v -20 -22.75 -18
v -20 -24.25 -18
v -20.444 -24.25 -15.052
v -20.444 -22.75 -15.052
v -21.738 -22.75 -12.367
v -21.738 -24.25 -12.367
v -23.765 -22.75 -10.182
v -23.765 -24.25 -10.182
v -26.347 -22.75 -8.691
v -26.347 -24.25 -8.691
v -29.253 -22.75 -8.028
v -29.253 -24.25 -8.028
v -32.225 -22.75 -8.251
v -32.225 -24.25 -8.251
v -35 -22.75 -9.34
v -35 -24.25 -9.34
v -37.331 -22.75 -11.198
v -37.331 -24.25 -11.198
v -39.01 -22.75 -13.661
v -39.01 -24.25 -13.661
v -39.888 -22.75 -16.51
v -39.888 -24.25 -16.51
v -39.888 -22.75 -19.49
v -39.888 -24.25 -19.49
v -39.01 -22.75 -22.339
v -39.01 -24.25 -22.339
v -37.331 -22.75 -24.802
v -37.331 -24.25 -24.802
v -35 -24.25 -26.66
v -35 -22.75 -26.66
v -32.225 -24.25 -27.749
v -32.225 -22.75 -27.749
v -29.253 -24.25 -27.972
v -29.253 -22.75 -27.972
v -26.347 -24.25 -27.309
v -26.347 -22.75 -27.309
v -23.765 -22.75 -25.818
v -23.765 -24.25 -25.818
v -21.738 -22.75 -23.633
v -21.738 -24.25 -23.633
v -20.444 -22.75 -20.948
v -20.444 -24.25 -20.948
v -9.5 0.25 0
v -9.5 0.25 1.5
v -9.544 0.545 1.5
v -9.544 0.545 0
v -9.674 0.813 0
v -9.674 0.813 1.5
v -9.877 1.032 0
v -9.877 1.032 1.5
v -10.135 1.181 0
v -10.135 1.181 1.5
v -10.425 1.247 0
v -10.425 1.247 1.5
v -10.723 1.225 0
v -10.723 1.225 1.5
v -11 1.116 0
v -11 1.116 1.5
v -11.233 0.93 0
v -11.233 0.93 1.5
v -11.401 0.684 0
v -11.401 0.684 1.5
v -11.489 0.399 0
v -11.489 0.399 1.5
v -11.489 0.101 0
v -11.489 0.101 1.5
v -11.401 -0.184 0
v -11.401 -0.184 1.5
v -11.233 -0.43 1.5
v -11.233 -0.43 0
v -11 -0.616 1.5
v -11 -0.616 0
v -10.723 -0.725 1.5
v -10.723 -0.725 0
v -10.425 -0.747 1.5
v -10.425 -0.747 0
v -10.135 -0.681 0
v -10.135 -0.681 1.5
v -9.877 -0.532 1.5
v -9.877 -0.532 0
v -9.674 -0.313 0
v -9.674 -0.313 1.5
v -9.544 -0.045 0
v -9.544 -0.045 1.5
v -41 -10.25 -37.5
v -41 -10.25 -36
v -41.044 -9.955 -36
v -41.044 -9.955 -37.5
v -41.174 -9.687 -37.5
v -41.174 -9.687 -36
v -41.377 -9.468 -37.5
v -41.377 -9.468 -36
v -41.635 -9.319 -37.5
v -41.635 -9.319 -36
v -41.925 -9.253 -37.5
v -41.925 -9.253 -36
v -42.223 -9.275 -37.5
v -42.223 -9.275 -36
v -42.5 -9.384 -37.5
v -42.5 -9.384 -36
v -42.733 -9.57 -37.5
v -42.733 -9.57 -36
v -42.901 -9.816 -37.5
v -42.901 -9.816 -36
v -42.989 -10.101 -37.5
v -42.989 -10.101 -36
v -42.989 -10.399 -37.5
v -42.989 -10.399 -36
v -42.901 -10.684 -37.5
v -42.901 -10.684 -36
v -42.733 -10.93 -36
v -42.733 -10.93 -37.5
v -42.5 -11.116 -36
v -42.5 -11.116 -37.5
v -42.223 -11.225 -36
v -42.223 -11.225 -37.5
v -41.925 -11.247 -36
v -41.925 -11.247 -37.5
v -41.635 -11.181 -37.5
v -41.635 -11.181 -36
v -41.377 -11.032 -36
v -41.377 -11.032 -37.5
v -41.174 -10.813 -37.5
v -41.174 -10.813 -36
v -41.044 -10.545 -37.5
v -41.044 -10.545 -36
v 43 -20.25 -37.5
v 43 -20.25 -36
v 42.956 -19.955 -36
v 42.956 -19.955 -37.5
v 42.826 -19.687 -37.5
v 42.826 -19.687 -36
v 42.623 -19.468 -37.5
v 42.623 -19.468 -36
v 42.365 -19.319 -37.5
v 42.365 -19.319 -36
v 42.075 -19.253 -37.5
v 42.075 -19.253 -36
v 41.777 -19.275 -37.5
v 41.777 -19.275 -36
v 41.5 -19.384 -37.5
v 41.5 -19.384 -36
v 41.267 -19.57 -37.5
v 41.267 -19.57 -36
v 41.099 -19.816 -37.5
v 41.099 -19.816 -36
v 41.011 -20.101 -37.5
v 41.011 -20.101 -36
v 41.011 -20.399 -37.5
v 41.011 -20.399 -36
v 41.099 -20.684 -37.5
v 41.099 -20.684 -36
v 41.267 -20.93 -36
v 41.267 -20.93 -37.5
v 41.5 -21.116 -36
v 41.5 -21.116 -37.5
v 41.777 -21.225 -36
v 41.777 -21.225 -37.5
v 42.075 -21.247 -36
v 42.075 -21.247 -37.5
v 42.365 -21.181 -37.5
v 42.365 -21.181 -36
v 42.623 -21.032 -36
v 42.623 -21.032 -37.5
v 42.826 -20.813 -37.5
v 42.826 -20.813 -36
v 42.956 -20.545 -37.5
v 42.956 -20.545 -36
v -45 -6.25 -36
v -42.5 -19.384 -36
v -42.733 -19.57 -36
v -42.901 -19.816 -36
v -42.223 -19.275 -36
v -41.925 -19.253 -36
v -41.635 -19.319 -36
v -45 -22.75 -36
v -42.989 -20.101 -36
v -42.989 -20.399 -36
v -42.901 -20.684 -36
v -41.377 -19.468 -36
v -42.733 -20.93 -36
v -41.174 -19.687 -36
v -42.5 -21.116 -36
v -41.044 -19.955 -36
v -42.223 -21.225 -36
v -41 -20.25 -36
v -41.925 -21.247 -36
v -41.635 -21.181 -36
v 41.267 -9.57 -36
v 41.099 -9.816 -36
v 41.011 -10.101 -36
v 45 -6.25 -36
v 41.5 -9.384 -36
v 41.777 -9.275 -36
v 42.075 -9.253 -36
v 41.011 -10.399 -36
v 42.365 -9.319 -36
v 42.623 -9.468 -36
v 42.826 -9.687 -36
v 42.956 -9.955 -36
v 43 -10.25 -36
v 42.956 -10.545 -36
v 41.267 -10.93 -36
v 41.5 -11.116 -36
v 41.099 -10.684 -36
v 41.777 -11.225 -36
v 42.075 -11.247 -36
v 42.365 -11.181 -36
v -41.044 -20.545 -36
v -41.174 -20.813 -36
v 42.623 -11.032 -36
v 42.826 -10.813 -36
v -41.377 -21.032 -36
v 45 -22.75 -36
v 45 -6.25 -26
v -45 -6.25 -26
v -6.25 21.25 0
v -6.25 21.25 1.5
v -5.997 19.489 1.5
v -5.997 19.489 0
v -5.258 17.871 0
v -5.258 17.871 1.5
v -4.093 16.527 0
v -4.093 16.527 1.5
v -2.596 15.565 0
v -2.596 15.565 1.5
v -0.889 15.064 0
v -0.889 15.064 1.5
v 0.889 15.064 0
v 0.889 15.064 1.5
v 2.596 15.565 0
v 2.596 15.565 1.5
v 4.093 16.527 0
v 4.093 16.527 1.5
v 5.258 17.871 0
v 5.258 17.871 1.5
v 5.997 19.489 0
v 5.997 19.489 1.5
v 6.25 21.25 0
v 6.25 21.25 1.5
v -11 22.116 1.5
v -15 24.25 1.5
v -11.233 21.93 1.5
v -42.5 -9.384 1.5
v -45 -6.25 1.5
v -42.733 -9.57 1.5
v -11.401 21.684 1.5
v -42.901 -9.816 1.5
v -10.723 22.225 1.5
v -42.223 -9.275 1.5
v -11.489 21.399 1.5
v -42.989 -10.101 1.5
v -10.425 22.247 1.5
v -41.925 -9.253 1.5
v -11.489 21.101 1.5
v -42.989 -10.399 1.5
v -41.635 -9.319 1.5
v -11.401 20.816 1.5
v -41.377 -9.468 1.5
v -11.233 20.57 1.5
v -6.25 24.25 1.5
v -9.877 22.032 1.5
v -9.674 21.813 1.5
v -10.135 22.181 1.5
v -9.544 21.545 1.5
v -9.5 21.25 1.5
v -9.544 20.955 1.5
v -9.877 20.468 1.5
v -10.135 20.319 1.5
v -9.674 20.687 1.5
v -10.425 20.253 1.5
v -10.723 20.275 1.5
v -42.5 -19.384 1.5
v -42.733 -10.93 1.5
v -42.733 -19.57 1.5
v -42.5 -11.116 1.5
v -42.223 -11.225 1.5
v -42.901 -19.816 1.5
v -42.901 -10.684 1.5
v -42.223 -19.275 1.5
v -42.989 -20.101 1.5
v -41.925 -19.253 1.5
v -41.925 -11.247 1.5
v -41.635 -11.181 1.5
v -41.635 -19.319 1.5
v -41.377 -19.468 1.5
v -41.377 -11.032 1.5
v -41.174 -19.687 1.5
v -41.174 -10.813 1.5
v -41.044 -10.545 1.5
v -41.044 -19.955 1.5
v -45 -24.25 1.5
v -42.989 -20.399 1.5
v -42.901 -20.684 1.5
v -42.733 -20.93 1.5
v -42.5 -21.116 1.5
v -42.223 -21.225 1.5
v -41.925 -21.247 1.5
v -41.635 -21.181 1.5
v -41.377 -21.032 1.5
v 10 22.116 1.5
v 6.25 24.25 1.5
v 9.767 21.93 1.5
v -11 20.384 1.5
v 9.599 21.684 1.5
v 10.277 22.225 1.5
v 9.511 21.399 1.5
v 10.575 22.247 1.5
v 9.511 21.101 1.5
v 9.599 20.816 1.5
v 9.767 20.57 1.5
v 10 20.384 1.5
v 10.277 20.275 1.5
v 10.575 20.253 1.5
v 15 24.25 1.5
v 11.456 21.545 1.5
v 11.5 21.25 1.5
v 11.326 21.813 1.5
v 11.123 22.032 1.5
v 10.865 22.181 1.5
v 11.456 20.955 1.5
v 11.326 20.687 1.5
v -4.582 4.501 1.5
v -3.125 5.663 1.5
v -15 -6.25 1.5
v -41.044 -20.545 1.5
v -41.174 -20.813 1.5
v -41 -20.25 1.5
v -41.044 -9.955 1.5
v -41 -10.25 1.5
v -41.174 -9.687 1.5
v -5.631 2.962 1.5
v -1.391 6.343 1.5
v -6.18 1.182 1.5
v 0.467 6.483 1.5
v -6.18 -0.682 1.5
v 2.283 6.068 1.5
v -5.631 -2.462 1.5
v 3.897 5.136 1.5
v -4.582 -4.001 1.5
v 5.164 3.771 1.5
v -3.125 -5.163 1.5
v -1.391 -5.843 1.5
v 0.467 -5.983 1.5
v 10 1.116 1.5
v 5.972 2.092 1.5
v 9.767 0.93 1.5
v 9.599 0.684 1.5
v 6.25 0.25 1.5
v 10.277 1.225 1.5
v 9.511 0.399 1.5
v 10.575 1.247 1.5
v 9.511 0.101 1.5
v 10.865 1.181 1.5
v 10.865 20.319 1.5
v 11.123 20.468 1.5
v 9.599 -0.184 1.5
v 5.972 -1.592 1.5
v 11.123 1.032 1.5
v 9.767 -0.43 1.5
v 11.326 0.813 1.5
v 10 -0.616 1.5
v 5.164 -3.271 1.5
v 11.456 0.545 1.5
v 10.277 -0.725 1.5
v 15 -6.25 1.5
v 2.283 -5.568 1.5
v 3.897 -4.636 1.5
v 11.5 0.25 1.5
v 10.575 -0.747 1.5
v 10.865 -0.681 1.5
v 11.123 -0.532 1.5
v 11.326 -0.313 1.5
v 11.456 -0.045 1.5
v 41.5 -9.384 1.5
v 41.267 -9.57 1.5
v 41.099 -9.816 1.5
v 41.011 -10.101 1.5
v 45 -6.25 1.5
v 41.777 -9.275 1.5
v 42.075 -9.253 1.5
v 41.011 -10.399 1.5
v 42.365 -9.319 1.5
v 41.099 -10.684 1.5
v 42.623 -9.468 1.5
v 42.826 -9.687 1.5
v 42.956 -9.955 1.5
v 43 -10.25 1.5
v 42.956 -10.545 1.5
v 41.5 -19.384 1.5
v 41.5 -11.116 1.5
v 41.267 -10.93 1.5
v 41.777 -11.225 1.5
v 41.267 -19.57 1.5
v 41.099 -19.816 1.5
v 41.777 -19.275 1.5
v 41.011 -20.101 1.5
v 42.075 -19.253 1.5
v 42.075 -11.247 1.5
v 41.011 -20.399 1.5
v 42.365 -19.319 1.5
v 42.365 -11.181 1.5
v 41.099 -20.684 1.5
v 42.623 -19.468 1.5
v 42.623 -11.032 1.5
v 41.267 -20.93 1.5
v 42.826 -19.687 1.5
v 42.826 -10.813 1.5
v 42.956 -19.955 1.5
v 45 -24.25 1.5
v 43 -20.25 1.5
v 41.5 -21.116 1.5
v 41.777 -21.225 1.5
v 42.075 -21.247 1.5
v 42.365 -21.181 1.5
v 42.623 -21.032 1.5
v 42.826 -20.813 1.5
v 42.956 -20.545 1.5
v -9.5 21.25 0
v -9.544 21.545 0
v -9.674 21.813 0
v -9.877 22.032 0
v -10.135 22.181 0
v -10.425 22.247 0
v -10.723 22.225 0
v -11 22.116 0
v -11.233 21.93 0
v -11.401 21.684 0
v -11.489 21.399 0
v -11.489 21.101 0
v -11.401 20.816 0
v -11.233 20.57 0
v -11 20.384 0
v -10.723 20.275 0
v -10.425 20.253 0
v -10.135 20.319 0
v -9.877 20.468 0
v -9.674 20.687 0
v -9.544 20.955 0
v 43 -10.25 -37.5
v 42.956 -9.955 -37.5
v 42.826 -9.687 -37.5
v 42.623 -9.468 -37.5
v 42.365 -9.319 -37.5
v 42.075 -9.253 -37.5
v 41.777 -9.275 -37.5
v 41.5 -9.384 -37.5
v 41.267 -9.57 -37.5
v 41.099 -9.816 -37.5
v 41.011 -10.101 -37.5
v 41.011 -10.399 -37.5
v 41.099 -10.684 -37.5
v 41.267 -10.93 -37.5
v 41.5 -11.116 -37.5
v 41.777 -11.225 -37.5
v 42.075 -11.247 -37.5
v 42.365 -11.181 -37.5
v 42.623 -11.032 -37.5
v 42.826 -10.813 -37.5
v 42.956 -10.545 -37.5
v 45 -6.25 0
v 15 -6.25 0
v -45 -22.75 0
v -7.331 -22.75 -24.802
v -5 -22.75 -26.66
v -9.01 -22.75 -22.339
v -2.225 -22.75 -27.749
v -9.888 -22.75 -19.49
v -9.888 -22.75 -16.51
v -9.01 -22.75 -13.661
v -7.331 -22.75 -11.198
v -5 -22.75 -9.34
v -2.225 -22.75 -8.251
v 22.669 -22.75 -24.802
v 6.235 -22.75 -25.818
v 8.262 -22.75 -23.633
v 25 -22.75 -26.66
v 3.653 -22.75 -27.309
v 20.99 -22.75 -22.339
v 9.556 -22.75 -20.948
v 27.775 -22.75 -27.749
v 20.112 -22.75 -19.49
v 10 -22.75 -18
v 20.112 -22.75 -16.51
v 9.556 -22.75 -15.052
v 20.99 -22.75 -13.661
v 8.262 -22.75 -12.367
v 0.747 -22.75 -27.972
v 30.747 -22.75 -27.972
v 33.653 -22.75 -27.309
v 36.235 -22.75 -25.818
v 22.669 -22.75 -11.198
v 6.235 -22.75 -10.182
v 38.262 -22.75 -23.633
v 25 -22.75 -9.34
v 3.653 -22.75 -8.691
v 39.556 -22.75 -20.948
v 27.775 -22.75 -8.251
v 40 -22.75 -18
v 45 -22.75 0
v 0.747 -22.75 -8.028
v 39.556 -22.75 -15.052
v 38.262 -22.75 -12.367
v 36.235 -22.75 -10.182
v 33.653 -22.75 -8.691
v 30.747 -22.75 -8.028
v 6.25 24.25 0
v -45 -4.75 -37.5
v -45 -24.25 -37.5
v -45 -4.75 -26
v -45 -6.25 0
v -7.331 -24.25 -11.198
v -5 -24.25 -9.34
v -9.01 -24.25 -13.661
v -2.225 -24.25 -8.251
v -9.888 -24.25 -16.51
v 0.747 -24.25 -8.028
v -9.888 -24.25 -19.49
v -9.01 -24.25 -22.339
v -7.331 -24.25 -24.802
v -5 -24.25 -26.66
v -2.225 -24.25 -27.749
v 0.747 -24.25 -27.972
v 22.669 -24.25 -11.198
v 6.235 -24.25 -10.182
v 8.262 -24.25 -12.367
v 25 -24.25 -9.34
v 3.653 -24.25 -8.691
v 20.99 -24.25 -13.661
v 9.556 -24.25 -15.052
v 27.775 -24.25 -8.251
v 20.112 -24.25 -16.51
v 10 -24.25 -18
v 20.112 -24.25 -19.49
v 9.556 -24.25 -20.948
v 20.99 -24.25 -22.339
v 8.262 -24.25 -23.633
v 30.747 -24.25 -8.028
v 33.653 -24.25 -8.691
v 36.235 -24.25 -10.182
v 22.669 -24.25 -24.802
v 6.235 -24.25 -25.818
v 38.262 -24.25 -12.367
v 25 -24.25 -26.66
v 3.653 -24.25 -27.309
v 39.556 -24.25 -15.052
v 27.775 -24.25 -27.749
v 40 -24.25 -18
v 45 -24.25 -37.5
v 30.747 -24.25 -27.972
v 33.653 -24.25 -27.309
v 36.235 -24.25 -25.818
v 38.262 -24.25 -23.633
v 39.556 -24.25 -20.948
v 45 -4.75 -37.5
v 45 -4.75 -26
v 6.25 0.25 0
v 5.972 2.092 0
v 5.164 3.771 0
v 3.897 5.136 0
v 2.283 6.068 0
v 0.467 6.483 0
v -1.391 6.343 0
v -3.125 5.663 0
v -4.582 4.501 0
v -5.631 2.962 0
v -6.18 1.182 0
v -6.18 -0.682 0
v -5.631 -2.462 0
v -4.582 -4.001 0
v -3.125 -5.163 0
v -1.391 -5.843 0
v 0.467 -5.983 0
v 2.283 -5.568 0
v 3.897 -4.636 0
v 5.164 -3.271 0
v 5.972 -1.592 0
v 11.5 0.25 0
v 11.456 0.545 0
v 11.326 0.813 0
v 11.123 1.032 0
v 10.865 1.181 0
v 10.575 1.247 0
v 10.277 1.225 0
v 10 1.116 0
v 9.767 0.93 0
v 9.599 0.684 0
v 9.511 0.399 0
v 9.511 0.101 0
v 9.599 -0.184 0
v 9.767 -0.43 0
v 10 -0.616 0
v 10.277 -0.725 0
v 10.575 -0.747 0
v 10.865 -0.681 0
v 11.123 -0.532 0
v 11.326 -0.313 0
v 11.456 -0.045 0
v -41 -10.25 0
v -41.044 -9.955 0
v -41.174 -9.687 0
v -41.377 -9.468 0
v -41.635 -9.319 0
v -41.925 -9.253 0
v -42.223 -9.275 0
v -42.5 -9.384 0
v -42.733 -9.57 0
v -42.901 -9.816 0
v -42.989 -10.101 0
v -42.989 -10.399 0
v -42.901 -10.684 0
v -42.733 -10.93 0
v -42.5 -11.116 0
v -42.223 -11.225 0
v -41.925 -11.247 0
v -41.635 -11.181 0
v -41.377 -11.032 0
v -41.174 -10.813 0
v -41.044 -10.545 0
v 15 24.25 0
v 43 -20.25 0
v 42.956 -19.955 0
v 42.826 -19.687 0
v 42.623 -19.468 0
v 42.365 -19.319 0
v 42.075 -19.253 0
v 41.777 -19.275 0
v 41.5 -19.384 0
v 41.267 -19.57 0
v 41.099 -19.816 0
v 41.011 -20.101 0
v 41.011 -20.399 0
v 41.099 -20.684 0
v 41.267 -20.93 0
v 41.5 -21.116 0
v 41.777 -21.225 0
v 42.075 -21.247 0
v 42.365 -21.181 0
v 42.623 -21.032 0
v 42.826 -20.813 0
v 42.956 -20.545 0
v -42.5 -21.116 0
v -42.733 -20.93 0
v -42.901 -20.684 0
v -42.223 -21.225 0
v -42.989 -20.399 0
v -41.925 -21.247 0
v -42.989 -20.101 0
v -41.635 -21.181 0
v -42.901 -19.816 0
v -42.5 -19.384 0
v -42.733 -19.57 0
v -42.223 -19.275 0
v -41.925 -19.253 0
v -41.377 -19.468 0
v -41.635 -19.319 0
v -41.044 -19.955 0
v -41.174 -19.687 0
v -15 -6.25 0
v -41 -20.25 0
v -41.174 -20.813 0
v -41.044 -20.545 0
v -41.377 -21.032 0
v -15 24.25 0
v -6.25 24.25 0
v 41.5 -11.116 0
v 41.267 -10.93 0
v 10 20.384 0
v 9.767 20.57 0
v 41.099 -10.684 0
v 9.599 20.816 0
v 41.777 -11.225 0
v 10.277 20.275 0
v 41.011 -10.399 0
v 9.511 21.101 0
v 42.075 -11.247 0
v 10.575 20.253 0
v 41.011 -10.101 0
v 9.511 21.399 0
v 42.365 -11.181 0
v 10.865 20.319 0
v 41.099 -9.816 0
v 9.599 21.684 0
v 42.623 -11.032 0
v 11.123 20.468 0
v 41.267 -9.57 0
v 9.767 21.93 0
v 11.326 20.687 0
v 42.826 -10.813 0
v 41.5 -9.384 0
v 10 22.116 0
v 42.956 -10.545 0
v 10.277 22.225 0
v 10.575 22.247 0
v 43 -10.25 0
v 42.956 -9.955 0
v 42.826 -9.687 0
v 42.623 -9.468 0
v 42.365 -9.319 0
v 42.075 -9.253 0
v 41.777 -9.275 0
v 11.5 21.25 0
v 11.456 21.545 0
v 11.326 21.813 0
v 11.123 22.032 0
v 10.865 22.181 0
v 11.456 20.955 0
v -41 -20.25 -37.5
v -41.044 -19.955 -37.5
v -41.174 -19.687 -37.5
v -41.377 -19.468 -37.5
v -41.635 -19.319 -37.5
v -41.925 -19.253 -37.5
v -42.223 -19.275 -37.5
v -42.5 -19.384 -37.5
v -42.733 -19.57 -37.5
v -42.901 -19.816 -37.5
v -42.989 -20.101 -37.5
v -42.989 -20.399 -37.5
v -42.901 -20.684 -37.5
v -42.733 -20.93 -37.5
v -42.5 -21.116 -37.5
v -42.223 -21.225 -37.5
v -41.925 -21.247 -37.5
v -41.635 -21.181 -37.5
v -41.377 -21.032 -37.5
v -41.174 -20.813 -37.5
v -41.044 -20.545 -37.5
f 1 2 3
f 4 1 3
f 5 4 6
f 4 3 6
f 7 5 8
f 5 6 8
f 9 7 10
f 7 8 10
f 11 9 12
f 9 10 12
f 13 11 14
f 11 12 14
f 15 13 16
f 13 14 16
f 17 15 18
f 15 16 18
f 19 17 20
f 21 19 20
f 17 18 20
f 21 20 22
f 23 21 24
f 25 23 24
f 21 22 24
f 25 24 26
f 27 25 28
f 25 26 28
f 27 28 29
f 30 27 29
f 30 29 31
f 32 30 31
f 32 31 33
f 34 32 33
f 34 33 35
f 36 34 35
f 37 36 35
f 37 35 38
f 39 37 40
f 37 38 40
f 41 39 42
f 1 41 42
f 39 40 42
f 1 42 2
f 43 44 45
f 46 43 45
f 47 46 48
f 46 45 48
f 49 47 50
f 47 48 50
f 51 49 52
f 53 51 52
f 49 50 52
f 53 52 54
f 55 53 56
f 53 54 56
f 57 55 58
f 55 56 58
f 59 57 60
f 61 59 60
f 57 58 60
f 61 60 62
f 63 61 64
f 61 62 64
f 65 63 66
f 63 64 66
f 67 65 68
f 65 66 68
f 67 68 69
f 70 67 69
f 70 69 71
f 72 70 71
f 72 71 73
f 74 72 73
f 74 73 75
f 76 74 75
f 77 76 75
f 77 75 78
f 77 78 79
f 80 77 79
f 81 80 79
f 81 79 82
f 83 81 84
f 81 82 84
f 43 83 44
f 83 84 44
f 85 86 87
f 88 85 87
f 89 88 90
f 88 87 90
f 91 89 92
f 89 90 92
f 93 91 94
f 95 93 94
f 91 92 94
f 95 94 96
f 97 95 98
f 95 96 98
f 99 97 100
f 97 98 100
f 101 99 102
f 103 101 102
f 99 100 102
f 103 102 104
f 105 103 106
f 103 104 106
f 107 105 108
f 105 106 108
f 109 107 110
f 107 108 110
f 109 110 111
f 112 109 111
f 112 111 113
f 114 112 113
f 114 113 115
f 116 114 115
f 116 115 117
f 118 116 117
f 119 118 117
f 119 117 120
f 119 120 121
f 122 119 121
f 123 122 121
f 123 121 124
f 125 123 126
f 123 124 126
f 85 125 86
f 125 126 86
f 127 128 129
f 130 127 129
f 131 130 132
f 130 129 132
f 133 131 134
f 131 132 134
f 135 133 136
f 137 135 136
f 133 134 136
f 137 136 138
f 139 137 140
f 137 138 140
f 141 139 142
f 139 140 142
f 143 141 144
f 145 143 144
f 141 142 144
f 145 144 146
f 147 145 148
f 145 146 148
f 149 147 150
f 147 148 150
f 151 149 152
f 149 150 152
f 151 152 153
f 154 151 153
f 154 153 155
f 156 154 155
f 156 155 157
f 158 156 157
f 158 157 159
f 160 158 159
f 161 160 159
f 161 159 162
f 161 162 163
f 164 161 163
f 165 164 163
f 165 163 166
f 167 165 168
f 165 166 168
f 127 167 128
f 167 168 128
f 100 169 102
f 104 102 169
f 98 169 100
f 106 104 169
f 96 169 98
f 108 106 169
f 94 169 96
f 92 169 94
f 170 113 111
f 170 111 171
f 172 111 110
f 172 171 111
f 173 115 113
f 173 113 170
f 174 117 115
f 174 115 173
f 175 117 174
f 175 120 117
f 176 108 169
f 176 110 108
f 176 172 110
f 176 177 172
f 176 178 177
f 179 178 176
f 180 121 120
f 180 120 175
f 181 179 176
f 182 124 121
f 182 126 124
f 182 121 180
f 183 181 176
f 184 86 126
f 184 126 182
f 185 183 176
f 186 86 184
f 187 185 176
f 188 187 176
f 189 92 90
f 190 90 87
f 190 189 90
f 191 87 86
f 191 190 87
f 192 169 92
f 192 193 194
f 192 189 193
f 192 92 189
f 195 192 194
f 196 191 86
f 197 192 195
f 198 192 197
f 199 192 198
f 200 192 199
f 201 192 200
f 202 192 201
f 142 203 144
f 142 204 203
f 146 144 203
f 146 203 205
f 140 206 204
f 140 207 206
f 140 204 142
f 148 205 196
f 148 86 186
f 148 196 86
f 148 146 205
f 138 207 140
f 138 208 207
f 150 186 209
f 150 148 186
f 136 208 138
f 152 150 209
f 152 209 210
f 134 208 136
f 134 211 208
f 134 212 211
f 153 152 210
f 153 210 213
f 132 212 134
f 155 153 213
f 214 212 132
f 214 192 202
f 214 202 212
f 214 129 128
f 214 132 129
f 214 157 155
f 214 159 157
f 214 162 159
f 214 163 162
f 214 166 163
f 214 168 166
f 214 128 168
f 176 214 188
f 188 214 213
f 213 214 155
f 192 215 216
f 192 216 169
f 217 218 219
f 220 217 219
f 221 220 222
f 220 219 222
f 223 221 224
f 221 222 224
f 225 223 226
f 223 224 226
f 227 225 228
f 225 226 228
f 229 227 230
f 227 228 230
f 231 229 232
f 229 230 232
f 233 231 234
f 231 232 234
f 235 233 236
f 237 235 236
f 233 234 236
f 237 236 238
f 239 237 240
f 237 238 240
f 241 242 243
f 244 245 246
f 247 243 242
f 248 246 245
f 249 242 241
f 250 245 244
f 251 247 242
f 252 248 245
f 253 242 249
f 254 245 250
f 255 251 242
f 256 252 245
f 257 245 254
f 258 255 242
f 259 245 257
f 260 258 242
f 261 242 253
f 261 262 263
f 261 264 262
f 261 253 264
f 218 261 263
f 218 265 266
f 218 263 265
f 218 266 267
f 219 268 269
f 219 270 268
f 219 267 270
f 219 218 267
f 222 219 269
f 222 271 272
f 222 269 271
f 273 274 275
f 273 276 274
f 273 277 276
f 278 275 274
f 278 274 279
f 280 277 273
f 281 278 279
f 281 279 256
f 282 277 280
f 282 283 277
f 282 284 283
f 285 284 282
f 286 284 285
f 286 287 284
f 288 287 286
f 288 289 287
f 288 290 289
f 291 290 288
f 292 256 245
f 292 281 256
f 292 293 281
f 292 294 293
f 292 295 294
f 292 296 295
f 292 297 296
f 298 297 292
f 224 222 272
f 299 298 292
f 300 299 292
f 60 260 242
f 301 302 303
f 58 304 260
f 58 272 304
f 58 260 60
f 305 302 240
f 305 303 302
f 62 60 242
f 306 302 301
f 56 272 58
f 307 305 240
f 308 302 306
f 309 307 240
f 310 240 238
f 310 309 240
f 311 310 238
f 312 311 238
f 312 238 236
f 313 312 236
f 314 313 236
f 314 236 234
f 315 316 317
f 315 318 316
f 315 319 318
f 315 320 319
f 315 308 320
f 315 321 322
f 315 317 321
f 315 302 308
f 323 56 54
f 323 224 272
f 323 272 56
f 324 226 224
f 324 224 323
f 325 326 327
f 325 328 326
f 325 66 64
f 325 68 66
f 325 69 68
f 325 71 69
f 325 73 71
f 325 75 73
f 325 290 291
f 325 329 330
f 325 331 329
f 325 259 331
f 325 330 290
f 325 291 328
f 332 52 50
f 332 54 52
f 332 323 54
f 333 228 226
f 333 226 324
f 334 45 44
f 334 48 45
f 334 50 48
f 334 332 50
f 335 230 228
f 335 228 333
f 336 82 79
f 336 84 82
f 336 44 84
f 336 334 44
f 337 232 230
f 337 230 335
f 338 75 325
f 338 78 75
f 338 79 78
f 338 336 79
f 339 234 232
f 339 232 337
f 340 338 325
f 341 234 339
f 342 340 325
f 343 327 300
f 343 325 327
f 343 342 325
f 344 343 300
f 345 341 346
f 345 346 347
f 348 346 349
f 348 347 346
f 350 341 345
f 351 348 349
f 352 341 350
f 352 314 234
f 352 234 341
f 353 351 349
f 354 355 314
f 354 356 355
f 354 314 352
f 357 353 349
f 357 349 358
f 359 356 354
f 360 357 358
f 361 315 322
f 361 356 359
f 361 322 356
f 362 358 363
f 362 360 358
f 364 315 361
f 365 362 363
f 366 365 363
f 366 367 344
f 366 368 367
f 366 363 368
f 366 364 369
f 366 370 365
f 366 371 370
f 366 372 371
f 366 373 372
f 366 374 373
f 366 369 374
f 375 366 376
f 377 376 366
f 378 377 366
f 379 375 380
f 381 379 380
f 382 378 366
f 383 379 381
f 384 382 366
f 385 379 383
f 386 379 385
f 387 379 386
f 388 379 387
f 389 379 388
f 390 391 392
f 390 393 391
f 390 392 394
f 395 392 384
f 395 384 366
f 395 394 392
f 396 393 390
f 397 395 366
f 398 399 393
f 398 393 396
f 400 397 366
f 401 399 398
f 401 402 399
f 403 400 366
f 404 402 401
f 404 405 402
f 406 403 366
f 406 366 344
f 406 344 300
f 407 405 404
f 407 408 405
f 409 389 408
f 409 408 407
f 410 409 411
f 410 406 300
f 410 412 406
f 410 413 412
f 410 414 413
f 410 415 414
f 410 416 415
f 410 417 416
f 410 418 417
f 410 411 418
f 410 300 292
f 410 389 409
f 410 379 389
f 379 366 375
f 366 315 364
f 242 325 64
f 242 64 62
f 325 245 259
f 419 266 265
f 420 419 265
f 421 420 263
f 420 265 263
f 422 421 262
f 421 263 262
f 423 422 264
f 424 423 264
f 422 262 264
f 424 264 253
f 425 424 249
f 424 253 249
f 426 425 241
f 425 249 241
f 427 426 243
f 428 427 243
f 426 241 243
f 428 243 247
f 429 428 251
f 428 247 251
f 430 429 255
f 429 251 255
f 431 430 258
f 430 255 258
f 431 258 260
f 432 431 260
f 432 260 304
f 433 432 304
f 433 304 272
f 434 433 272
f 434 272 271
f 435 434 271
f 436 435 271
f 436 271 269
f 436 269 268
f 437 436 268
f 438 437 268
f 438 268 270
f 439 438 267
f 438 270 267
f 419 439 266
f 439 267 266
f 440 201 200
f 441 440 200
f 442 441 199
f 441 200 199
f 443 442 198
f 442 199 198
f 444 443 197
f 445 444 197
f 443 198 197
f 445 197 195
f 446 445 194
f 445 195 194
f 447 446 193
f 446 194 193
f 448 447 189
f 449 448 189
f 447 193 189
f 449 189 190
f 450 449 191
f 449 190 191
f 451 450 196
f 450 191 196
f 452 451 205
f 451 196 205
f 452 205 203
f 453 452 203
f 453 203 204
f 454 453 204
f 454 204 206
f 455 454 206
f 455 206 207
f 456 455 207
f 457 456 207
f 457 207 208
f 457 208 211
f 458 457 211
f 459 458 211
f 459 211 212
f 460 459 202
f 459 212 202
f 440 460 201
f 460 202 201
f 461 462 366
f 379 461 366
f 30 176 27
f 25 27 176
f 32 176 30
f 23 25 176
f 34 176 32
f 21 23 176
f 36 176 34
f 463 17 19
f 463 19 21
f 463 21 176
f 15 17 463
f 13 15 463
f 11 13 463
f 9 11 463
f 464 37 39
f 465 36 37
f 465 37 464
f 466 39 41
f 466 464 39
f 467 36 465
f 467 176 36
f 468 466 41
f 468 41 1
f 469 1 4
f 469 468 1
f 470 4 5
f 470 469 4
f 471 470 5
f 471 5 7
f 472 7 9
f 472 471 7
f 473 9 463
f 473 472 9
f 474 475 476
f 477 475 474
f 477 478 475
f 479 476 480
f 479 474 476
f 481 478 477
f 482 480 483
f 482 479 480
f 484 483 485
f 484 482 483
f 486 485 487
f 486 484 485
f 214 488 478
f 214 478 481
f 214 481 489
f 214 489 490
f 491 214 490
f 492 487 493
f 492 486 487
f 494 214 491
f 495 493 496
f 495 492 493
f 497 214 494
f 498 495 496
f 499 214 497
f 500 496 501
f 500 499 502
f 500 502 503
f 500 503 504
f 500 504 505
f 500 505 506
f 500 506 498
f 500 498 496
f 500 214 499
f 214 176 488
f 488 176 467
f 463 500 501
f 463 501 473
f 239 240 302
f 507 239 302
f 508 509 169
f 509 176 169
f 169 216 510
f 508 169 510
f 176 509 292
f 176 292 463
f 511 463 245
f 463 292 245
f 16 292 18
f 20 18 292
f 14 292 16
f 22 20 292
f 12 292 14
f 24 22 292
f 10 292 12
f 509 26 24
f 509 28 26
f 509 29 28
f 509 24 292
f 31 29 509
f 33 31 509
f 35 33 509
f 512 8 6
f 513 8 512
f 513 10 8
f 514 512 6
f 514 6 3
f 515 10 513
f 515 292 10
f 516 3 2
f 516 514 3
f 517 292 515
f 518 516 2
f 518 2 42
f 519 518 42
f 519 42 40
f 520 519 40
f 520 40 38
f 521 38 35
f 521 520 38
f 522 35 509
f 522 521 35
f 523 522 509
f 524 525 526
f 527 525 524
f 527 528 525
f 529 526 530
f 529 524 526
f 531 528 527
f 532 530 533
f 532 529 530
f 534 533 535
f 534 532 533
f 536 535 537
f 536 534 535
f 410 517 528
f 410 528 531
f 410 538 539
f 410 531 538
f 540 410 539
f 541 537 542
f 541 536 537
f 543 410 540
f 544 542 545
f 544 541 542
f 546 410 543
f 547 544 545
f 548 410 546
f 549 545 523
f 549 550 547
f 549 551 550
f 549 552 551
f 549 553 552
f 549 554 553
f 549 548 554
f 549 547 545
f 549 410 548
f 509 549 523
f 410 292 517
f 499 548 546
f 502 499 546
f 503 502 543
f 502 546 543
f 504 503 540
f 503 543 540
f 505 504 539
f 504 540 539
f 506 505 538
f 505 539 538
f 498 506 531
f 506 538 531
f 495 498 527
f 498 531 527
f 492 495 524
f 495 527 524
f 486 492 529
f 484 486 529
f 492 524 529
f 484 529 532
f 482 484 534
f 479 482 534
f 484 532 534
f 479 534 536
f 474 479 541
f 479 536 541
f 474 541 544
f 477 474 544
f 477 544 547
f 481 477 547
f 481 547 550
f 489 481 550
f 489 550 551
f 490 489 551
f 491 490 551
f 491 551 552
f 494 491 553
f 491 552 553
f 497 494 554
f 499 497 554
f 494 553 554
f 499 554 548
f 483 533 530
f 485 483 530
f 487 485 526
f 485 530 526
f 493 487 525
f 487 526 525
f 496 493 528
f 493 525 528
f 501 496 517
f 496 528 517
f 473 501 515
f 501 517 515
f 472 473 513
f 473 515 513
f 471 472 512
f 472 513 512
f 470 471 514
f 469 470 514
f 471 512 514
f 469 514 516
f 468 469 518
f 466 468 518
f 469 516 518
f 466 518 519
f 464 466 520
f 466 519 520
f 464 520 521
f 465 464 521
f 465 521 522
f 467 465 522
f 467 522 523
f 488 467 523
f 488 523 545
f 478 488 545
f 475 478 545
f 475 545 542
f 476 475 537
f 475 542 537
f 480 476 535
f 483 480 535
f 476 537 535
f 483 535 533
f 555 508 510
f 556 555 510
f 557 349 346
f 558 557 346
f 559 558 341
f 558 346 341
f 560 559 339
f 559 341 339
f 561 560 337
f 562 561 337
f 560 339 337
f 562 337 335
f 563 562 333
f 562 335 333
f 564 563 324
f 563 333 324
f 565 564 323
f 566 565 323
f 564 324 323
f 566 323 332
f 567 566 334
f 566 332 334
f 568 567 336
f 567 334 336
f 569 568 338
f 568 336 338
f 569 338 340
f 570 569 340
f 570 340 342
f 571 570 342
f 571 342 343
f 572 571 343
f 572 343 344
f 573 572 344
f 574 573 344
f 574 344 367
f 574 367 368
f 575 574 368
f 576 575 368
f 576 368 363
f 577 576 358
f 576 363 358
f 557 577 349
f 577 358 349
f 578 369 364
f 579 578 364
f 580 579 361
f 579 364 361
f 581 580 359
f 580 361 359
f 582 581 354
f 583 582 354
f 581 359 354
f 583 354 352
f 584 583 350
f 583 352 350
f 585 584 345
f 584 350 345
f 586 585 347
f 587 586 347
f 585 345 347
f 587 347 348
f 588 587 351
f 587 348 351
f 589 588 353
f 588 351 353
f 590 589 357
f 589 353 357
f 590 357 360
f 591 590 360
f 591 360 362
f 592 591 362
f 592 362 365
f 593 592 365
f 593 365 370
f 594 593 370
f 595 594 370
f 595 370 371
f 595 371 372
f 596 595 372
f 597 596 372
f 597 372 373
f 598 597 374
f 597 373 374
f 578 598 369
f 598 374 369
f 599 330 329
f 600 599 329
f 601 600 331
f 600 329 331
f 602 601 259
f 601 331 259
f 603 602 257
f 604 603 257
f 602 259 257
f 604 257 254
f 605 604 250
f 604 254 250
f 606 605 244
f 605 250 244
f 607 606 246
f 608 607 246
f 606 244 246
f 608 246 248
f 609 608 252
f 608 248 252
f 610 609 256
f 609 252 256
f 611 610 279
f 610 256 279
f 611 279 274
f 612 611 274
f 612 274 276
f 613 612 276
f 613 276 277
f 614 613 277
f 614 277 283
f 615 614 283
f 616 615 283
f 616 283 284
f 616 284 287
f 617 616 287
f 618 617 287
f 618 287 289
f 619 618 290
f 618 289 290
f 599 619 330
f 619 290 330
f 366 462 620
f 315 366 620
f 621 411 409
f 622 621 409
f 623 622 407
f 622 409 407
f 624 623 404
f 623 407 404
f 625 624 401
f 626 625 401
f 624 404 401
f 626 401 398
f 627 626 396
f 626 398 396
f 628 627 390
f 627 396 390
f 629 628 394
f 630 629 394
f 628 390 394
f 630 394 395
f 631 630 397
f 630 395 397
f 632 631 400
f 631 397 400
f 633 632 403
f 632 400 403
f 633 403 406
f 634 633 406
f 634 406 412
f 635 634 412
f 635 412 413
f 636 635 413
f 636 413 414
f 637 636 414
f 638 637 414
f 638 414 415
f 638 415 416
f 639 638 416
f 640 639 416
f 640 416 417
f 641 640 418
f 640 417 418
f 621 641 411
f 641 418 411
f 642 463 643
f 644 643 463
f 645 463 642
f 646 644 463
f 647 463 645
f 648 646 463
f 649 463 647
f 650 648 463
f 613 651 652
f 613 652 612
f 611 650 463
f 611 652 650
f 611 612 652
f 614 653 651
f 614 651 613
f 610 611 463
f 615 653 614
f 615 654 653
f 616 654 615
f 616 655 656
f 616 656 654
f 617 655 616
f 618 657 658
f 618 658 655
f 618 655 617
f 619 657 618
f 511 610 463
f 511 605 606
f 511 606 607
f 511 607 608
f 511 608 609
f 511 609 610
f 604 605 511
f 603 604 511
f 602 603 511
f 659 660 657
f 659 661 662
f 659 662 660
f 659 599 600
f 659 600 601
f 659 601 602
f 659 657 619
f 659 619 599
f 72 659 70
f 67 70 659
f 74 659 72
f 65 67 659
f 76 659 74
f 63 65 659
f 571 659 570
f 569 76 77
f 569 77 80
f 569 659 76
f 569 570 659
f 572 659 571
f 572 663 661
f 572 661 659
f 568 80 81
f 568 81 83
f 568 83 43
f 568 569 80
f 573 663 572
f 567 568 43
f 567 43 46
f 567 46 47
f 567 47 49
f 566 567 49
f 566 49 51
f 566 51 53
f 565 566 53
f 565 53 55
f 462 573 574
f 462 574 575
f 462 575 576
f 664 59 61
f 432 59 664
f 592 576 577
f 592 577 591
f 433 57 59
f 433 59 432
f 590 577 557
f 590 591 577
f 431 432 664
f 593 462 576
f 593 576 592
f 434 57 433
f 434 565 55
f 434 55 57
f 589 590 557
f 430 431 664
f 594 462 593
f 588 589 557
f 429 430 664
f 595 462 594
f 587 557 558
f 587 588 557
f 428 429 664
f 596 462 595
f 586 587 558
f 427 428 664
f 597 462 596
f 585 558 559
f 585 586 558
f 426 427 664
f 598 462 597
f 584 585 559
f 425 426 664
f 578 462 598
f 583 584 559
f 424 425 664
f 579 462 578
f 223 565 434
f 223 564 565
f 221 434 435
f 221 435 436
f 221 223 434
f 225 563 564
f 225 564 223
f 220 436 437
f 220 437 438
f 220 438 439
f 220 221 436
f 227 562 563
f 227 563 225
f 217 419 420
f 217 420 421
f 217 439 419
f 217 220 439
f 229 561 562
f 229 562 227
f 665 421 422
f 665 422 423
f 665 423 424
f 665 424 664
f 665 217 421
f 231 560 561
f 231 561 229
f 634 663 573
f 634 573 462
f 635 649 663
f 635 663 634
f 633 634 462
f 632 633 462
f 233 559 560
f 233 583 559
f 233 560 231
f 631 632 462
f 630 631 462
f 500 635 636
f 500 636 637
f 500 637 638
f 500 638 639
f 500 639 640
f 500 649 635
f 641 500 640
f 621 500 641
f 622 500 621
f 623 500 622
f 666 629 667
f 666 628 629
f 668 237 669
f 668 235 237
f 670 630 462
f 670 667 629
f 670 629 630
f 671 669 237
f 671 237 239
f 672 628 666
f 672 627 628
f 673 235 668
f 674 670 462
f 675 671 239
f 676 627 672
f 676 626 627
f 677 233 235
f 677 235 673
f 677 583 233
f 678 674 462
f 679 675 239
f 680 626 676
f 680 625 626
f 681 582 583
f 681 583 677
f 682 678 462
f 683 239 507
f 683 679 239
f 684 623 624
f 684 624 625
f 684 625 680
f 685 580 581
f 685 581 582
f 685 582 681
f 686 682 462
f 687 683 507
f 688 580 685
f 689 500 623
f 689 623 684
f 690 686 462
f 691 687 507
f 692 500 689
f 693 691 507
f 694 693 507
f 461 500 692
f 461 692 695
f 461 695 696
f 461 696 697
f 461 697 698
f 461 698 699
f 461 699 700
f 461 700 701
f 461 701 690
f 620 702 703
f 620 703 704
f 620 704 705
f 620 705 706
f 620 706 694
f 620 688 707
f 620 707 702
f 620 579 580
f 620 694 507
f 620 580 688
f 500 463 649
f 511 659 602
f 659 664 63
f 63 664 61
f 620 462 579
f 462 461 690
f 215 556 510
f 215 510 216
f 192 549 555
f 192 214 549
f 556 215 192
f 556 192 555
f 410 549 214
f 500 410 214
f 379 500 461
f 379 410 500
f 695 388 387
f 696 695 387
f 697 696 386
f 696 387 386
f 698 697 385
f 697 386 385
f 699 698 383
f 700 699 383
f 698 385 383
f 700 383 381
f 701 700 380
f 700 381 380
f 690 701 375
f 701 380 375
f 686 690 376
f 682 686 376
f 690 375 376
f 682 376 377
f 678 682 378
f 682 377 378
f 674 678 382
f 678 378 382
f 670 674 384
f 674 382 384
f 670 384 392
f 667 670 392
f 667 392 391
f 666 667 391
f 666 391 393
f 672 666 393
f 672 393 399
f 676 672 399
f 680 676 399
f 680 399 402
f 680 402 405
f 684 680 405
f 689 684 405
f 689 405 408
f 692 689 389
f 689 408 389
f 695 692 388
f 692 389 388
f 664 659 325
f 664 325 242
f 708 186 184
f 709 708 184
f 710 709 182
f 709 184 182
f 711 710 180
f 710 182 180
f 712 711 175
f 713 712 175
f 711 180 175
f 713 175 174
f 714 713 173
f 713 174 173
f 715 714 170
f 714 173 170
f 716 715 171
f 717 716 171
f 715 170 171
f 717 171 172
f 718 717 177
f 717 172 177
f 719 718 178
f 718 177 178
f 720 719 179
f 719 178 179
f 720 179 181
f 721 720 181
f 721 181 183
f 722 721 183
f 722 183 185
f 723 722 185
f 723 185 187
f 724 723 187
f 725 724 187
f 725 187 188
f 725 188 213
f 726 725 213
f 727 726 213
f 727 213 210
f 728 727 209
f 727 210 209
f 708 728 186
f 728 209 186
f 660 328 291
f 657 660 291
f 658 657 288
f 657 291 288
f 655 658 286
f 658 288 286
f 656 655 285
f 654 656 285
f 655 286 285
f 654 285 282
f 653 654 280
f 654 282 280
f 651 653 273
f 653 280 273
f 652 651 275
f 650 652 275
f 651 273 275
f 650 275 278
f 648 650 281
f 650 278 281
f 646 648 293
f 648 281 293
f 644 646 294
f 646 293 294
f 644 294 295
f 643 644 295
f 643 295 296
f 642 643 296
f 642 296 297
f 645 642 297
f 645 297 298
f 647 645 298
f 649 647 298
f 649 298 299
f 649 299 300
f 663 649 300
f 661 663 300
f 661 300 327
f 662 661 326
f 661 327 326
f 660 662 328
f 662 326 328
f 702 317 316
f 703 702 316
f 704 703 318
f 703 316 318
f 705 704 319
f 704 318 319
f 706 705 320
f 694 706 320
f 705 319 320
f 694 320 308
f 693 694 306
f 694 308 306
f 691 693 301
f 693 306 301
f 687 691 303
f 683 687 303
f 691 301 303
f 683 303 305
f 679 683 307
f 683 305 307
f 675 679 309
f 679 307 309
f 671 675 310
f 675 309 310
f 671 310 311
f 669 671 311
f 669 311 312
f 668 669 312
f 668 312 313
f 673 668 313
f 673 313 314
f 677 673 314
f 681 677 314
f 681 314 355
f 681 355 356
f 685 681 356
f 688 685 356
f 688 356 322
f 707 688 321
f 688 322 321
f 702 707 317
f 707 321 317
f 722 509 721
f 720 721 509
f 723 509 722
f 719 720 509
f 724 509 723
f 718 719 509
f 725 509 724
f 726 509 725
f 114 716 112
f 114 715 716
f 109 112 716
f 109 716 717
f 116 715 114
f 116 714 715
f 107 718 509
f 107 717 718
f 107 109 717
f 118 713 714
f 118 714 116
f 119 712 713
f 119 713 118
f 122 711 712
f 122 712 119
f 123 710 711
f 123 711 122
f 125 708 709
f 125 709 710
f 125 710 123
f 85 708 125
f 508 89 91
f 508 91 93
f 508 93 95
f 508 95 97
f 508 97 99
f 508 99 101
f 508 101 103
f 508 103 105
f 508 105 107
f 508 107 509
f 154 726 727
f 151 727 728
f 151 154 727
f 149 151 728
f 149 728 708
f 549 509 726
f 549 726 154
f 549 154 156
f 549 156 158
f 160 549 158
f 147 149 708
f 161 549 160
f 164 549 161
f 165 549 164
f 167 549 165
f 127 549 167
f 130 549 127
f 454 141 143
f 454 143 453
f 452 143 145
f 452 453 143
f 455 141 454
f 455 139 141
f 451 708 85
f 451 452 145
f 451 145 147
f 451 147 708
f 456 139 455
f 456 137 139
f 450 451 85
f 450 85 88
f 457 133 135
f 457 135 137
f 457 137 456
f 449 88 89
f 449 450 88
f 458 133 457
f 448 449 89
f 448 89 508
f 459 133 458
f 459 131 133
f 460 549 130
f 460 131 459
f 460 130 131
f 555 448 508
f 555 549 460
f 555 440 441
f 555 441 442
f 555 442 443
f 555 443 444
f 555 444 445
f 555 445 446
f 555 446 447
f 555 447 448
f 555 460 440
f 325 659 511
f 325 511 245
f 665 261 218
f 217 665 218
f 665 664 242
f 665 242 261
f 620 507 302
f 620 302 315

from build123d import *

# Parameters (mm, degrees)
F0_W      = 30
F0_H      = 48.5
F1_DEPTH  = 1.5
F2_W      = 30
F2_H      = 1.5
F3_DEPTH  = 37.5
F4_W      = 30
F4_H      = 1.5
F5_DEPTH  = 18
F6_W      = 30
F6_H      = 1.5
F7_DEPTH  = 10
F9_DEPTH  = 30
F11_R     = 1
F11_R_2   = 6.25
F12_DEPTH = 1.5
F13_R     = 1
F14_DEPTH = 1.5
F15_R     = 10
F16_DEPTH = 1.5


with BuildPart() as f1:
    # F0 (on Top) → F1 (new body)
    with BuildSketch(Plane.XY):
        Rectangle(F0_W, F0_H)
    extrude(amount=F1_DEPTH)

    # F2 (on face) → F3 (join)
    with BuildSketch(Plane(origin=(0, 0, 0), x_dir=(1, 0, 0), z_dir=(0, 0, -1))):
        with Locations((0, 23.5)):
            Rectangle(F2_W, F2_H)
    extrude(amount=F3_DEPTH)

    # F4 (on face) → F5 (join)
    with BuildSketch(Plane(origin=(0, -22.75, 0), x_dir=(-1, 0, 0), z_dir=(0, 1, 0))):
        with Locations((0, -36.75)):
            Rectangle(F4_W, F4_H)
    extrude(amount=F5_DEPTH)

    # F6 (on face) → F7 (join)
    with BuildSketch(Plane.XY.offset(-36)):
        with Locations((0, -5.5)):
            Rectangle(F6_W, F6_H)
    extrude(amount=F7_DEPTH)

    # F8 (on face) → F9 (join)
    with BuildSketch(Plane.YZ.offset(15)):
        Polygon((-22.75, 1.5), (-24.25, 1.5), (-24.25, -37.5), (-22.75, -37.5), (-6.25, -37.5), (-4.75, -37.5), (-4.75, -26), (-6.25, -26), (-6.25, -36), (-22.75, -36), (-22.75, 0), (-6.25, 0), (-6.25, 1.5), align=None)
    extrude(amount=F9_DEPTH)

    # F10: F1 across plane


with BuildPart() as f1_1:
    add(f1.part)
    add(f1.part.mirror(Plane.YZ))

    # F11 (on face) → F12 (cut, through all)
    with BuildSketch(Plane.XY.offset(1.5)):
        with Locations((10.5, 21.25)):
            Circle(F11_R)
        with Locations((10.5, 0.25)):
            Circle(F11_R)
        with BuildLine():
            Line((-6.25, 24.25), (-6.25, 21.25))
            ThreePointArc((-6.25, 21.25), (0, 15), (6.25, 21.25))
            Line((6.25, 21.25), (6.25, 24.25))
            Line((6.25, 24.25), (-6.25, 24.25))
        make_face()
        with Locations((-10.5, 21.25)):
            Circle(F11_R)
        with Locations((-10.5, 0.25)):
            Circle(F11_R)
        with Locations((0, 0.25)):
            Circle(F11_R_2)
        with Locations((-42, -10.25)):
            Circle(F11_R)
        with Locations((-42, -20.25)):
            Circle(F11_R)
        with Locations((42, -10.25)):
            Circle(F11_R)
        with Locations((42, -20.25)):
            Circle(F11_R)
    extrude(amount=-F12_DEPTH, mode=Mode.SUBTRACT)

    # F13 (on face) → F14 (cut, through all)
    with BuildSketch(Plane.XY.offset(-36)):
        with Locations((-42, -10.25)):
            Circle(F13_R)
        with Locations((-42, -20.25)):
            Circle(F13_R)
        with Locations((42, -10.25)):
            Circle(F13_R)
        with Locations((42, -20.25)):
            Circle(F13_R)
    extrude(amount=-F14_DEPTH, mode=Mode.SUBTRACT)

    # F15 (on face) → F16 (cut, through all)
    with BuildSketch(Plane.XZ.offset(24.25)):
        with Locations((0, -18)):
            Circle(F15_R)
        with Locations((-30, -18)):
            Circle(F15_R)
        with Locations((30, -18)):
            Circle(F15_R)
    extrude(amount=-F16_DEPTH, mode=Mode.SUBTRACT)


solid = f1_1.part
